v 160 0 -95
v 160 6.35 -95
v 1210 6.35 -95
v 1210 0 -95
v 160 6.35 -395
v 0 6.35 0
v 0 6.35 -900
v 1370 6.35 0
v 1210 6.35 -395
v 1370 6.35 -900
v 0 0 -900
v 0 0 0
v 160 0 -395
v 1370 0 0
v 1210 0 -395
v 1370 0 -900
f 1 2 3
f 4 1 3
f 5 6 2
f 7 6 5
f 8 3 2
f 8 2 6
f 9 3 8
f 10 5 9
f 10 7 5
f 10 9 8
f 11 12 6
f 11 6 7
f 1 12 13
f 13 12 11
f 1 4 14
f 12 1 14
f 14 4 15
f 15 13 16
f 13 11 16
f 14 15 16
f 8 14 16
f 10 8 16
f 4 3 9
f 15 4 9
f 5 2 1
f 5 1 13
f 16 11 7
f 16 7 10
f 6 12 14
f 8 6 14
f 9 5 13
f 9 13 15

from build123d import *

# Parameters (mm, degrees)
SKETCH1_W           = 1370
SKETCH1_H           = 900
BOSS_EXTRUDE1_DEPTH = 6.35
CUT_EXTRUDE1_REACH  = 1641.189
SKETCH2_W           = 1050
SKETCH2_H           = 300


with BuildPart() as part:
    # Sketch1 → Boss-Extrude1 (new body)
    with BuildSketch(Plane(origin=(0, 0, 0), x_dir=(1, 0, 0), z_dir=(0, 1, 0))):
        with Locations((685, 450)):
            Rectangle(SKETCH1_W, SKETCH1_H)
    extrude(amount=BOSS_EXTRUDE1_DEPTH)

    # Sketch2 → Cut-Extrude1 (cut, up to next)
    with BuildSketch(Plane(origin=(0, 6.35, 0), x_dir=(1, 0, 0), z_dir=(0, 1, 0)), mode=Mode.PRIVATE) as cut_extrude1_sk1:
        with Locations((685, 245)):
            Rectangle(SKETCH2_W, SKETCH2_H)
    cut_extrude1_tool1 = extrude(cut_extrude1_sk1.sketch, amount=-CUT_EXTRUDE1_REACH, mode=Mode.PRIVATE) & part.part
    add(cut_extrude1_tool1.solids().sort_by_distance((685, 6.35, -245))[0], mode=Mode.SUBTRACT)


solid = part.part
